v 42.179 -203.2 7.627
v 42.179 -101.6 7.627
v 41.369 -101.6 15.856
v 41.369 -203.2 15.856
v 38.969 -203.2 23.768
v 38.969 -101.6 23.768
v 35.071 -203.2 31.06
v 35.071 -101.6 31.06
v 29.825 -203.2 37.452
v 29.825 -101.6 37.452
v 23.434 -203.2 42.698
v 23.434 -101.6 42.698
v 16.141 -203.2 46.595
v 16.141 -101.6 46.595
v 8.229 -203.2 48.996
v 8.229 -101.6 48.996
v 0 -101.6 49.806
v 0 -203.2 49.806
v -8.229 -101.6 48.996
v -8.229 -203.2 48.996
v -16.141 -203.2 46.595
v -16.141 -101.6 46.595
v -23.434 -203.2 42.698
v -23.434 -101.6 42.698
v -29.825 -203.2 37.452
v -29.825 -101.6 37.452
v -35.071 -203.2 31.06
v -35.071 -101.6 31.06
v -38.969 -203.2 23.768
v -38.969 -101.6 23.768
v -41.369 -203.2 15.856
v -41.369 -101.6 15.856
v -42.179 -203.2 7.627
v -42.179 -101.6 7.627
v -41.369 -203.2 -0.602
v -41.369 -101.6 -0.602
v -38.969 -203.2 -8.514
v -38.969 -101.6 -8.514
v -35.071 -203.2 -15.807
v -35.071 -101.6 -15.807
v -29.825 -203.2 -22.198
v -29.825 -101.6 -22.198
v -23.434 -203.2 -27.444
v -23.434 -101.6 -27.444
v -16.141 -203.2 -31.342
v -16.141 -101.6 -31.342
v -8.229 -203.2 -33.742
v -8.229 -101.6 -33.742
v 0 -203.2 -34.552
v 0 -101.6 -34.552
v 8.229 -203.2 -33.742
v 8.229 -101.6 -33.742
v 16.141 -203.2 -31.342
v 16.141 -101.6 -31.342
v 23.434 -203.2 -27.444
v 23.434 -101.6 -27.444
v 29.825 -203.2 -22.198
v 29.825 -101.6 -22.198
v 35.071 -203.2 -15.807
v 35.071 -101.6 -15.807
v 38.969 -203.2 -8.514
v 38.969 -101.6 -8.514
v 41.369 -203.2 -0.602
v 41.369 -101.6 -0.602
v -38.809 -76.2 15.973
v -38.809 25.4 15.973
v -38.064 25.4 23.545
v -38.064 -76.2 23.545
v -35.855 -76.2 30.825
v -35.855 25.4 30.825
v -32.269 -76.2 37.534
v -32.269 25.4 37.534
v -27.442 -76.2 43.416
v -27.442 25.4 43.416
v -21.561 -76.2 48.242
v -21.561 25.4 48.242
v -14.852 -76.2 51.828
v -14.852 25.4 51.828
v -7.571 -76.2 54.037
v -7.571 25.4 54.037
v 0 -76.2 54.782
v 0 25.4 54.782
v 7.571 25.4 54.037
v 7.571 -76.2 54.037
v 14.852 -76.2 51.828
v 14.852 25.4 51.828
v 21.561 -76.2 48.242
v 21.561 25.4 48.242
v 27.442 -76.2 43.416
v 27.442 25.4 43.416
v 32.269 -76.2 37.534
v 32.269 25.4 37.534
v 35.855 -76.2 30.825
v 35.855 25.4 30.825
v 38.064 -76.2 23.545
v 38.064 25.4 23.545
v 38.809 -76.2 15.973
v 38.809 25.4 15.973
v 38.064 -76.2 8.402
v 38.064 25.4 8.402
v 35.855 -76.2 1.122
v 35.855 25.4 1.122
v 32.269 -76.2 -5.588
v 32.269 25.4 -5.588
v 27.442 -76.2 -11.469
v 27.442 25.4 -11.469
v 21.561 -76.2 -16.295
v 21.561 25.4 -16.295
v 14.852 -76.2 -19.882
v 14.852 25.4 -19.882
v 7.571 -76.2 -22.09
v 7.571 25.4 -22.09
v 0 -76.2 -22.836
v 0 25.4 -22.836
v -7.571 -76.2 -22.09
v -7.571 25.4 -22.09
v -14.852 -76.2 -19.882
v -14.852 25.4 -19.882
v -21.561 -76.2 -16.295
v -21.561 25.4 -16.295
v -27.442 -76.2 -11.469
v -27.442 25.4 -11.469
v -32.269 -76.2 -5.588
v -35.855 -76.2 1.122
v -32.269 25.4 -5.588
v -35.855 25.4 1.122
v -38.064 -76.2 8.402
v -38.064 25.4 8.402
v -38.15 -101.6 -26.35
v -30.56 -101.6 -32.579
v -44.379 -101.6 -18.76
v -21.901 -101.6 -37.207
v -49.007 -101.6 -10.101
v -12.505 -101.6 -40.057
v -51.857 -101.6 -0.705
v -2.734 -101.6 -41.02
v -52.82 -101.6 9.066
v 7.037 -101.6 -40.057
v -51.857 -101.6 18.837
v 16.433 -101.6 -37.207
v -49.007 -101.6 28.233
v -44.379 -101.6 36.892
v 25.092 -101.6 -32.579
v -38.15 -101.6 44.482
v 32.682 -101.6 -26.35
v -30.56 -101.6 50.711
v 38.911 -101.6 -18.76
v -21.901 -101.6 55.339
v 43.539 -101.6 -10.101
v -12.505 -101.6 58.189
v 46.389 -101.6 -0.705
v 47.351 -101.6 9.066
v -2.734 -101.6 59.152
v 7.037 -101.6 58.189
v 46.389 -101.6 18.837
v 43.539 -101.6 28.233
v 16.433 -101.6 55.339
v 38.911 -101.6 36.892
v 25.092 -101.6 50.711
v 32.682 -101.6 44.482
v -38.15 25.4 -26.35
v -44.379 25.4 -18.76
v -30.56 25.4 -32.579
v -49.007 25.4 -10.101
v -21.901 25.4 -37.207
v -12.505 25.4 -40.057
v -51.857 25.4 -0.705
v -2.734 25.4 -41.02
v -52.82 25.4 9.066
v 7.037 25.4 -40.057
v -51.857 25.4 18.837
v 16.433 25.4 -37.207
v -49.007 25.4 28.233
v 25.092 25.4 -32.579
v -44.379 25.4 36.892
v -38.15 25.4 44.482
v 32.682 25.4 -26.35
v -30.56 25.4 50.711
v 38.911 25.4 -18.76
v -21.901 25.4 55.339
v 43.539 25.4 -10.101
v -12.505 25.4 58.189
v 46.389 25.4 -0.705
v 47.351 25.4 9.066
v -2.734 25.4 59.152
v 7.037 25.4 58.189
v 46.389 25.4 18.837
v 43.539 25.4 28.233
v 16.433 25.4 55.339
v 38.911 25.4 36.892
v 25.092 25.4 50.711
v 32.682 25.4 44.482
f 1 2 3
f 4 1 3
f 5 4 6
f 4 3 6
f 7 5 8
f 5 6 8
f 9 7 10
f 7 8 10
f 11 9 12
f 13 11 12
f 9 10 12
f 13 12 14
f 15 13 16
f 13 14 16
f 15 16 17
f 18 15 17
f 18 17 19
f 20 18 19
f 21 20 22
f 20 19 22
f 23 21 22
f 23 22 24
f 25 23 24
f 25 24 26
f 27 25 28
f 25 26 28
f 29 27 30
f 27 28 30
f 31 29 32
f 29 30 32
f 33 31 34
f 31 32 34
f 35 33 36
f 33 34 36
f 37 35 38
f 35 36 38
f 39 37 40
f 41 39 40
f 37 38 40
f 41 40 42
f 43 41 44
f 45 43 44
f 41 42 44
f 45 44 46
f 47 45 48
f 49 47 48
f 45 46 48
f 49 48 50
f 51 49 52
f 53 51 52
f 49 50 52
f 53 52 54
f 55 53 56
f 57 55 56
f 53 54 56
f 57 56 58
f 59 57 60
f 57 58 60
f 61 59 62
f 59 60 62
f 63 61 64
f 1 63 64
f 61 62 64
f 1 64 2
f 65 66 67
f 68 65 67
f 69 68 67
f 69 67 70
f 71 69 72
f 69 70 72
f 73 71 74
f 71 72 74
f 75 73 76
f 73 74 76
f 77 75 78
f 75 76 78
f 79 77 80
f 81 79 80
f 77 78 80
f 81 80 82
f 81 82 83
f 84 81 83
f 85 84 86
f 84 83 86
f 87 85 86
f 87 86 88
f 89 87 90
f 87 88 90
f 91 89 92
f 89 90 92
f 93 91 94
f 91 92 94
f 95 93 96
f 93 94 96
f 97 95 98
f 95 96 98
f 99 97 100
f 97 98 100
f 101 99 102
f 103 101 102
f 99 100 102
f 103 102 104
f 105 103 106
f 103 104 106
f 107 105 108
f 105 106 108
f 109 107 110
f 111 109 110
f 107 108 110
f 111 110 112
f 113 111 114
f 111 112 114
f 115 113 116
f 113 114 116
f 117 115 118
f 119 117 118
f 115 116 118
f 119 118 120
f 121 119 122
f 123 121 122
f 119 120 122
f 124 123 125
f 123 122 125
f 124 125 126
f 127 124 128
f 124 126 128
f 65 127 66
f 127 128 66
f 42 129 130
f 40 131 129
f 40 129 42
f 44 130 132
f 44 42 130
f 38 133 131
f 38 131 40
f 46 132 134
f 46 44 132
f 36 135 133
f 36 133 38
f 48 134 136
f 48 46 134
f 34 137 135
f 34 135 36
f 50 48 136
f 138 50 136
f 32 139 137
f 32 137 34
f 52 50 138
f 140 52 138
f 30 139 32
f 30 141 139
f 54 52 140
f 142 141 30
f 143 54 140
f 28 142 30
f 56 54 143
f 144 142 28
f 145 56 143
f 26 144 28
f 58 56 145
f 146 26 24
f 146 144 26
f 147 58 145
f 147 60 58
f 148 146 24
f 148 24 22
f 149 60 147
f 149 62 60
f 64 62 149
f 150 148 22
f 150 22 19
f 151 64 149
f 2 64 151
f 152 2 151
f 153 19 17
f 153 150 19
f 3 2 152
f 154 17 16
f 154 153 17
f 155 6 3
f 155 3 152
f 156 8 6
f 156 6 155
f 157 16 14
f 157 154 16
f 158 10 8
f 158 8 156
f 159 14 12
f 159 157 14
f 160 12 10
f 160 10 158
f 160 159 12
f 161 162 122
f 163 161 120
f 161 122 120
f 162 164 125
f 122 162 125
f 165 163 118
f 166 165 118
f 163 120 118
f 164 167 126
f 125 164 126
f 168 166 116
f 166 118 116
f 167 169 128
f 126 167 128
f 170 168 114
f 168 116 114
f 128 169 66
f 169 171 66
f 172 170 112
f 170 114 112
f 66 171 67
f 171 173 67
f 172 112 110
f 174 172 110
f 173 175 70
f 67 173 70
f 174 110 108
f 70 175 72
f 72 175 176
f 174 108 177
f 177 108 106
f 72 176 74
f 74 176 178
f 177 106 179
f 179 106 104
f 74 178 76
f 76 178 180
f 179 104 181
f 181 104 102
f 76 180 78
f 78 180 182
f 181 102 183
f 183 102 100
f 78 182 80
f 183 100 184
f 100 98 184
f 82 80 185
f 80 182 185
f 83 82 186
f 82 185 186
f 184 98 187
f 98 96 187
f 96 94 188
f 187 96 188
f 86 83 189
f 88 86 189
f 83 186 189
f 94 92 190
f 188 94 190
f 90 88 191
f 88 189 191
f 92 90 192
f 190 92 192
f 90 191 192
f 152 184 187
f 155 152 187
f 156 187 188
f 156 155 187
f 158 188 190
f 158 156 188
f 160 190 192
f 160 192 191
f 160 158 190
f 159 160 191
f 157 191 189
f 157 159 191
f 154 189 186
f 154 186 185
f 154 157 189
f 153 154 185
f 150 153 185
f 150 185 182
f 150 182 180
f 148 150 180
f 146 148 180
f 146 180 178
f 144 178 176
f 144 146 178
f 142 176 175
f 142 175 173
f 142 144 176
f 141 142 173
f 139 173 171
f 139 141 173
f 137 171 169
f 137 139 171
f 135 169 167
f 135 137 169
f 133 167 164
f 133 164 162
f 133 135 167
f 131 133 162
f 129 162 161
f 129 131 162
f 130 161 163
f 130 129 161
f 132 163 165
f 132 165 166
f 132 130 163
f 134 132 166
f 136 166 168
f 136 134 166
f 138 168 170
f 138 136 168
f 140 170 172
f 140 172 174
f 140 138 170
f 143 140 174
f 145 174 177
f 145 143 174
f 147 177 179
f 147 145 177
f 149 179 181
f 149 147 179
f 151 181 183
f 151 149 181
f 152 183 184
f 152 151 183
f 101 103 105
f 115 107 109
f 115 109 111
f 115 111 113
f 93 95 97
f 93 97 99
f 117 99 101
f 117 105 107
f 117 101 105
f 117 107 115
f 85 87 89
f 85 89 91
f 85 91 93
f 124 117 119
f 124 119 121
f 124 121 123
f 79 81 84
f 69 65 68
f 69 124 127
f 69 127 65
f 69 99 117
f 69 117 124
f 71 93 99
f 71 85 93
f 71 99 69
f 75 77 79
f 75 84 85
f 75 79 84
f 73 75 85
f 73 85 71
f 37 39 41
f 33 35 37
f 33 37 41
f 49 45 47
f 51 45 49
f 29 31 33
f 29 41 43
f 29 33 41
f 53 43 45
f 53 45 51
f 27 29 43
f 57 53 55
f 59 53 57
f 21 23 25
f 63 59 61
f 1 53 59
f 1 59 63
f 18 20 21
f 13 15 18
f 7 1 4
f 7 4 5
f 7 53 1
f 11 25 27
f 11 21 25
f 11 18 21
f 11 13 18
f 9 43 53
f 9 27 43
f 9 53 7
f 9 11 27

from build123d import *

# Parameters (mm, degrees)
F0_R     = 50.0856425189
F1_DEPTH = 101.6
F2_R     = 42.1792579473
F3_DEPTH = 101.6
F4_DEPTH = 25.4
F5_R     = 38.8092501819
F6_DEPTH = 101.6


with BuildPart() as f1:
    # F0 (on Front) → F1 (new body)
    with BuildSketch(Plane.XZ):
        with Locations((-2.7341553941, 9.0658813715)):
            Circle(F0_R)
    extrude(amount=F1_DEPTH)

    # F2 (on face) → F3 (join)
    with BuildSketch(Plane.XZ.offset(101.6)):
        with Locations((0, 7.6268524863)):
            Circle(F2_R)
    extrude(amount=F3_DEPTH)

    # F4 (add): a face of the model
    f4_faces = [f1.faces().sort_by_distance(p)[0] for p in [
        (-2.7341553941, 0, 9.0658813715),
    ]]
    extrude(f4_faces, amount=F4_DEPTH)

    # F5 (on face) → F6 (cut)
    with BuildSketch(Plane(origin=(0, 25.4, 0), x_dir=(-1, 0, 0), z_dir=(0, 1, 0))):
        with Locations((0, 15.973219648)):
            Circle(F5_R)
    extrude(amount=-F6_DEPTH, mode=Mode.SUBTRACT)


solid = f1.part
